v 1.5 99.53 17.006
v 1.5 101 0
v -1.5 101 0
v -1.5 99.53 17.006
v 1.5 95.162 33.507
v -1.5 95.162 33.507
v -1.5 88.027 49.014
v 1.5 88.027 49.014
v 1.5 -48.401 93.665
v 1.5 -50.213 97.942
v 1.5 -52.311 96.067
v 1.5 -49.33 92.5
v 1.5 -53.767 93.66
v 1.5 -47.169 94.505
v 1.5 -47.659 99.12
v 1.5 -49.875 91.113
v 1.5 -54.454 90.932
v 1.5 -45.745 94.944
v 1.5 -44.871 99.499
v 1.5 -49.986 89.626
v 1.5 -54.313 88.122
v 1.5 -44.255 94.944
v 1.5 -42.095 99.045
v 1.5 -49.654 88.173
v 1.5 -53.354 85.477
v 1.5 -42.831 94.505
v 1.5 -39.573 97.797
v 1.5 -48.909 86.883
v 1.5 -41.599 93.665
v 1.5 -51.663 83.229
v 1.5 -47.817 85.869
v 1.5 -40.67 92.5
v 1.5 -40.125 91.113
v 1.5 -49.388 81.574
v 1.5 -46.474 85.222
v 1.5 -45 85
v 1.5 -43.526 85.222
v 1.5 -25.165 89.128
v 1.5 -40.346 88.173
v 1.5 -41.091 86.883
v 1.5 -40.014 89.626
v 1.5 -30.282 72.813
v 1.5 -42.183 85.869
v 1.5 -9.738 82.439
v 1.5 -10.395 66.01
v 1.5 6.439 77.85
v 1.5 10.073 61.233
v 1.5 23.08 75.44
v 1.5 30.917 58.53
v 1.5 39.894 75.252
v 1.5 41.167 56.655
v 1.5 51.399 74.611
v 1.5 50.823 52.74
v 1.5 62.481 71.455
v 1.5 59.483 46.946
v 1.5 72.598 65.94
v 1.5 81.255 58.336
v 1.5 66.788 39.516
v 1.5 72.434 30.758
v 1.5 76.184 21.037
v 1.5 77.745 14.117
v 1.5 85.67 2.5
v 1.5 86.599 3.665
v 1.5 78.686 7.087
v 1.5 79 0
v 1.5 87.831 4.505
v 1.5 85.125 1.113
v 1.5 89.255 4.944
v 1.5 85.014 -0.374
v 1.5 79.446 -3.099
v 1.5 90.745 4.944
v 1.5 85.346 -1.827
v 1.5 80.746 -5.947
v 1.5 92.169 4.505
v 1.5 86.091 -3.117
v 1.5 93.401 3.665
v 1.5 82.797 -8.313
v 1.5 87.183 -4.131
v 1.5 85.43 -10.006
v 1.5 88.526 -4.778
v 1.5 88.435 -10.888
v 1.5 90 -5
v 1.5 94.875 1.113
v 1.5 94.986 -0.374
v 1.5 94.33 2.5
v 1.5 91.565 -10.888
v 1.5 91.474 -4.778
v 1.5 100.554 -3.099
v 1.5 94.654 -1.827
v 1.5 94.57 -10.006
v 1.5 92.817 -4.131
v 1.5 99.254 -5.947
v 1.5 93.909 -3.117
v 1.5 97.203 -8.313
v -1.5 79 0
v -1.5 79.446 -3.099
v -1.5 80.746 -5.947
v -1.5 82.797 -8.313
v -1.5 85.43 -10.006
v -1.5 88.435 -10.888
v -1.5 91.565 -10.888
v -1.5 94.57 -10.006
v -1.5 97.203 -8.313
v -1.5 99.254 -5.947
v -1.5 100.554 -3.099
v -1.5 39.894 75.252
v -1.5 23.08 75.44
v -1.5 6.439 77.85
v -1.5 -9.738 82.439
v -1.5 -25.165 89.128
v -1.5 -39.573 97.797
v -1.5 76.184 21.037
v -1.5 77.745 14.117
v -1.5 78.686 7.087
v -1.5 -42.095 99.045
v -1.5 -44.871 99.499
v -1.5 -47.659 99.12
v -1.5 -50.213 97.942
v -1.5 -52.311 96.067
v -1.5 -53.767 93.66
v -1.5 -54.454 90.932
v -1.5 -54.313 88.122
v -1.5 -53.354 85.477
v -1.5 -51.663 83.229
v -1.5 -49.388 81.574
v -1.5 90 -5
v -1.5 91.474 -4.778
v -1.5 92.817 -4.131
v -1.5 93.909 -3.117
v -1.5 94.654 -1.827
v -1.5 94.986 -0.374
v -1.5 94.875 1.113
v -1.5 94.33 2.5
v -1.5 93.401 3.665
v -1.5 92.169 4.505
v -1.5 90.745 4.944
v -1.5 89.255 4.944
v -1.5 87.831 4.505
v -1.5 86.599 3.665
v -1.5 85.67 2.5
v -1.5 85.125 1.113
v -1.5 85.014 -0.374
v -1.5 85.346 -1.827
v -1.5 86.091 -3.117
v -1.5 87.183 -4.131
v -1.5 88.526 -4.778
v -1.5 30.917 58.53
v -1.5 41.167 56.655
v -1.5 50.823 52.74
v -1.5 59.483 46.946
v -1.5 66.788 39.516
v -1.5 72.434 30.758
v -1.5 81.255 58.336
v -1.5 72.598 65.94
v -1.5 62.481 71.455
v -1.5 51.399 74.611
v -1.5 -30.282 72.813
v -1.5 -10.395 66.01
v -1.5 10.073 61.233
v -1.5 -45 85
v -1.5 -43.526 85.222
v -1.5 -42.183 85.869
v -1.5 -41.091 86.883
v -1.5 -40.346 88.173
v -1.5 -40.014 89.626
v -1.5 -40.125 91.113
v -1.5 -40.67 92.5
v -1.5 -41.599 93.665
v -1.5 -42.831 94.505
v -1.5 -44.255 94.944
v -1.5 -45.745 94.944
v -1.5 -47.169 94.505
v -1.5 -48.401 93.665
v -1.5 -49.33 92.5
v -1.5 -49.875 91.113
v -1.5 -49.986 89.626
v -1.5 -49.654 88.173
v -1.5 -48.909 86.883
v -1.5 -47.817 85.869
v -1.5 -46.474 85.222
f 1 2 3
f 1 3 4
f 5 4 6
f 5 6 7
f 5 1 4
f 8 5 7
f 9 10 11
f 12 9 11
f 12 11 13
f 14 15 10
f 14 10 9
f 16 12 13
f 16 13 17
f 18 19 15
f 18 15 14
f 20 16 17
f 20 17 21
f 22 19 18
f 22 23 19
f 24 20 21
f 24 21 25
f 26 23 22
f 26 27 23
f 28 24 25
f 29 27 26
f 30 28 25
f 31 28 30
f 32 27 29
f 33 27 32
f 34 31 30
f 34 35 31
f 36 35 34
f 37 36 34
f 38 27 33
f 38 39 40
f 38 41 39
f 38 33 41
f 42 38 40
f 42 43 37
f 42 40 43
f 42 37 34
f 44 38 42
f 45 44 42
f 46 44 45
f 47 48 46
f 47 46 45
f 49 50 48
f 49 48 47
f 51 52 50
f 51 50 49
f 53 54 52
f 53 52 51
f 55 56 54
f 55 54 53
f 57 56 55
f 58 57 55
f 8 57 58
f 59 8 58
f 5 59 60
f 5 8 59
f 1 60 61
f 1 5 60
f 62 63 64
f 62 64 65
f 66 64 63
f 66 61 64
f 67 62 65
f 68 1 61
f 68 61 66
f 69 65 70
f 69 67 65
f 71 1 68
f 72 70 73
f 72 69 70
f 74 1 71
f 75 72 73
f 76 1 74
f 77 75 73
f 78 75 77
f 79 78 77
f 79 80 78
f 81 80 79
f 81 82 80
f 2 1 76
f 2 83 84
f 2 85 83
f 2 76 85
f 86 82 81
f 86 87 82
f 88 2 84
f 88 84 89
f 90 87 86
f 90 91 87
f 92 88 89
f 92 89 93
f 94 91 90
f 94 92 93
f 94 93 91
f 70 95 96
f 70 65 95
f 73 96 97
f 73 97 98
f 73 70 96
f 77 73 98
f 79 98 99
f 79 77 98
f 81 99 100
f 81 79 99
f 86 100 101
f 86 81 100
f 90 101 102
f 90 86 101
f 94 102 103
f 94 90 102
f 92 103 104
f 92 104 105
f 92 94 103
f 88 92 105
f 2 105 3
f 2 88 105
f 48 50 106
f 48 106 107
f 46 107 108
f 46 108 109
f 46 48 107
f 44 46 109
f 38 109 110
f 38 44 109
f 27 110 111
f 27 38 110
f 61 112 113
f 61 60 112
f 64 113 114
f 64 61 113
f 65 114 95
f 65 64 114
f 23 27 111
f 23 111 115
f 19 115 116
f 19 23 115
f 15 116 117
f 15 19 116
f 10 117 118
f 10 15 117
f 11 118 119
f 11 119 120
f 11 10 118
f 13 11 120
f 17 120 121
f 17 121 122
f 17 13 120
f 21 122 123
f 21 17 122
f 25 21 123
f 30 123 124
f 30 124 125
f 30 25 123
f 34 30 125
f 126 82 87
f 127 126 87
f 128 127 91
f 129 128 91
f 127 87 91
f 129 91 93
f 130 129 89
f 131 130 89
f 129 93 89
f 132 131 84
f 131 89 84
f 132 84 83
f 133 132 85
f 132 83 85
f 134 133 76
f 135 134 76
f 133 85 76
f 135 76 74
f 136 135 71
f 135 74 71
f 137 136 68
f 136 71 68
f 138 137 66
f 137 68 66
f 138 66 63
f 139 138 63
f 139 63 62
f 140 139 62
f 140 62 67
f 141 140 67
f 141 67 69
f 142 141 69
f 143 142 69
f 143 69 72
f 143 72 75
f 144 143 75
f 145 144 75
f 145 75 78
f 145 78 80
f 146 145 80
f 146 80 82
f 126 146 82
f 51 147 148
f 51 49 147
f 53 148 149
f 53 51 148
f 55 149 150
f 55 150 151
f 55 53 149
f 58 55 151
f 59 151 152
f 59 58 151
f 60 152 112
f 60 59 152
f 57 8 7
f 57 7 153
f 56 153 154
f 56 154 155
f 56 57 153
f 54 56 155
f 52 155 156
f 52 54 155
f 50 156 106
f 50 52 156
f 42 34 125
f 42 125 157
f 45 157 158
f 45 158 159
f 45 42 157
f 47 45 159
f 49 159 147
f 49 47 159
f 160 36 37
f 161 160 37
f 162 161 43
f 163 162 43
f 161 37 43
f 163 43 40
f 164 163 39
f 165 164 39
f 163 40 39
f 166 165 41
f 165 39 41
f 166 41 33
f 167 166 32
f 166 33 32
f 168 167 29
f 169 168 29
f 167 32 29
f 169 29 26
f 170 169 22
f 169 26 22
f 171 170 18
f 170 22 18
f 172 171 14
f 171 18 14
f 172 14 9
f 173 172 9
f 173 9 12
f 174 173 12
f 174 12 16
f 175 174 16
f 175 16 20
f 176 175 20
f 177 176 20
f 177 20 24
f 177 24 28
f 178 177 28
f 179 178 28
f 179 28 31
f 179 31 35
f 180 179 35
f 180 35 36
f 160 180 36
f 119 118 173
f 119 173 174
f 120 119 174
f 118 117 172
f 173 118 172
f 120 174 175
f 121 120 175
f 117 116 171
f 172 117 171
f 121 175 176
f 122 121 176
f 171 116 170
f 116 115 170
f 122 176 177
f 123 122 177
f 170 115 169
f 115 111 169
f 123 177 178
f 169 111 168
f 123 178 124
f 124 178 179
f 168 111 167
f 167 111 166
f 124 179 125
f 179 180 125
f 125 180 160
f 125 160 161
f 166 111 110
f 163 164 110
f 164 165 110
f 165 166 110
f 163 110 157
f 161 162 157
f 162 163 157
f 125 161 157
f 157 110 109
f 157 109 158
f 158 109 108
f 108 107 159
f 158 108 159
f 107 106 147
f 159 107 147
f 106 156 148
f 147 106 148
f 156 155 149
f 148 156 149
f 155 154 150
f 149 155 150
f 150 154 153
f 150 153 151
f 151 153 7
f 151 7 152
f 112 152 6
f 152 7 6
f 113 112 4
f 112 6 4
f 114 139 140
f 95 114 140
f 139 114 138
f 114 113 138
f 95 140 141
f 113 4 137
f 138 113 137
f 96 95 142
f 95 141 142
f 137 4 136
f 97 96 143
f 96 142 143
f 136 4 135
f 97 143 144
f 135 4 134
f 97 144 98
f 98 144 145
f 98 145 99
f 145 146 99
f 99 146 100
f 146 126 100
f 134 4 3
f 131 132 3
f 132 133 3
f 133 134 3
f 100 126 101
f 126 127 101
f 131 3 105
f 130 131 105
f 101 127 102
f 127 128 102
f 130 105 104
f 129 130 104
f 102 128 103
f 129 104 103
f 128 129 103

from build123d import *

# Parameters (mm, degrees)
BOSS_EXTRUDE1_DEPTH = 1.5
SKETCH2_R           = 5
CUT_EXTRUDE1_DEPTH  = 142.810613143


with BuildPart() as part:
    # Sketch1 → Boss-Extrude1 (new, symmetric)
    with BuildSketch(Plane(origin=(0, 0, 0), x_dir=(0, 0, -1), z_dir=(1, 0, 0))):
        with BuildLine():
            ThreePointArc((0, 79), (11, 90), (0, 101))
            ThreePointArc((0, 101), (-25.350874614, 97.701945149), (-49.014054674, 88.027343403))
            ThreePointArc((-49.014054674, 88.027343403), (-68.978437503, 67.692387852), (-75.252234106, 39.89442974))
            ThreePointArc((-75.252234106, 39.89442974), (-79.876334442, -1.725579257), (-97.797422275, -39.573195612))
            ThreePointArc((-97.797422275, -39.573195612), (-94.917356951, -53.128320897), (-81.574017035, -49.387802533))
            ThreePointArc((-81.574017035, -49.387802533), (-66.010073659, -10.395208993), (-58.530464131, 30.917187762))
            ThreePointArc((-58.530464131, 30.917187762), (-46.946256543, 59.483246729), (-21.037120215, 76.184451628))
            ThreePointArc((-21.037120215, 76.184451628), (-10.612348227, 78.292988751), (0, 79))
        make_face()
    extrude(amount=BOSS_EXTRUDE1_DEPTH, both=True)

    # Sketch2 → Cut-Extrude1 (cut, through all)
    with BuildSketch(Plane(origin=(1.5, 0, 0), x_dir=(0, 0, -1), z_dir=(1, 0, 0))):
        with Locations((0, 90)):
            Circle(SKETCH2_R)
        with Locations((-90, -45)):
            Circle(SKETCH2_R)
    extrude(amount=-CUT_EXTRUDE1_DEPTH, mode=Mode.SUBTRACT)


solid = part.part
